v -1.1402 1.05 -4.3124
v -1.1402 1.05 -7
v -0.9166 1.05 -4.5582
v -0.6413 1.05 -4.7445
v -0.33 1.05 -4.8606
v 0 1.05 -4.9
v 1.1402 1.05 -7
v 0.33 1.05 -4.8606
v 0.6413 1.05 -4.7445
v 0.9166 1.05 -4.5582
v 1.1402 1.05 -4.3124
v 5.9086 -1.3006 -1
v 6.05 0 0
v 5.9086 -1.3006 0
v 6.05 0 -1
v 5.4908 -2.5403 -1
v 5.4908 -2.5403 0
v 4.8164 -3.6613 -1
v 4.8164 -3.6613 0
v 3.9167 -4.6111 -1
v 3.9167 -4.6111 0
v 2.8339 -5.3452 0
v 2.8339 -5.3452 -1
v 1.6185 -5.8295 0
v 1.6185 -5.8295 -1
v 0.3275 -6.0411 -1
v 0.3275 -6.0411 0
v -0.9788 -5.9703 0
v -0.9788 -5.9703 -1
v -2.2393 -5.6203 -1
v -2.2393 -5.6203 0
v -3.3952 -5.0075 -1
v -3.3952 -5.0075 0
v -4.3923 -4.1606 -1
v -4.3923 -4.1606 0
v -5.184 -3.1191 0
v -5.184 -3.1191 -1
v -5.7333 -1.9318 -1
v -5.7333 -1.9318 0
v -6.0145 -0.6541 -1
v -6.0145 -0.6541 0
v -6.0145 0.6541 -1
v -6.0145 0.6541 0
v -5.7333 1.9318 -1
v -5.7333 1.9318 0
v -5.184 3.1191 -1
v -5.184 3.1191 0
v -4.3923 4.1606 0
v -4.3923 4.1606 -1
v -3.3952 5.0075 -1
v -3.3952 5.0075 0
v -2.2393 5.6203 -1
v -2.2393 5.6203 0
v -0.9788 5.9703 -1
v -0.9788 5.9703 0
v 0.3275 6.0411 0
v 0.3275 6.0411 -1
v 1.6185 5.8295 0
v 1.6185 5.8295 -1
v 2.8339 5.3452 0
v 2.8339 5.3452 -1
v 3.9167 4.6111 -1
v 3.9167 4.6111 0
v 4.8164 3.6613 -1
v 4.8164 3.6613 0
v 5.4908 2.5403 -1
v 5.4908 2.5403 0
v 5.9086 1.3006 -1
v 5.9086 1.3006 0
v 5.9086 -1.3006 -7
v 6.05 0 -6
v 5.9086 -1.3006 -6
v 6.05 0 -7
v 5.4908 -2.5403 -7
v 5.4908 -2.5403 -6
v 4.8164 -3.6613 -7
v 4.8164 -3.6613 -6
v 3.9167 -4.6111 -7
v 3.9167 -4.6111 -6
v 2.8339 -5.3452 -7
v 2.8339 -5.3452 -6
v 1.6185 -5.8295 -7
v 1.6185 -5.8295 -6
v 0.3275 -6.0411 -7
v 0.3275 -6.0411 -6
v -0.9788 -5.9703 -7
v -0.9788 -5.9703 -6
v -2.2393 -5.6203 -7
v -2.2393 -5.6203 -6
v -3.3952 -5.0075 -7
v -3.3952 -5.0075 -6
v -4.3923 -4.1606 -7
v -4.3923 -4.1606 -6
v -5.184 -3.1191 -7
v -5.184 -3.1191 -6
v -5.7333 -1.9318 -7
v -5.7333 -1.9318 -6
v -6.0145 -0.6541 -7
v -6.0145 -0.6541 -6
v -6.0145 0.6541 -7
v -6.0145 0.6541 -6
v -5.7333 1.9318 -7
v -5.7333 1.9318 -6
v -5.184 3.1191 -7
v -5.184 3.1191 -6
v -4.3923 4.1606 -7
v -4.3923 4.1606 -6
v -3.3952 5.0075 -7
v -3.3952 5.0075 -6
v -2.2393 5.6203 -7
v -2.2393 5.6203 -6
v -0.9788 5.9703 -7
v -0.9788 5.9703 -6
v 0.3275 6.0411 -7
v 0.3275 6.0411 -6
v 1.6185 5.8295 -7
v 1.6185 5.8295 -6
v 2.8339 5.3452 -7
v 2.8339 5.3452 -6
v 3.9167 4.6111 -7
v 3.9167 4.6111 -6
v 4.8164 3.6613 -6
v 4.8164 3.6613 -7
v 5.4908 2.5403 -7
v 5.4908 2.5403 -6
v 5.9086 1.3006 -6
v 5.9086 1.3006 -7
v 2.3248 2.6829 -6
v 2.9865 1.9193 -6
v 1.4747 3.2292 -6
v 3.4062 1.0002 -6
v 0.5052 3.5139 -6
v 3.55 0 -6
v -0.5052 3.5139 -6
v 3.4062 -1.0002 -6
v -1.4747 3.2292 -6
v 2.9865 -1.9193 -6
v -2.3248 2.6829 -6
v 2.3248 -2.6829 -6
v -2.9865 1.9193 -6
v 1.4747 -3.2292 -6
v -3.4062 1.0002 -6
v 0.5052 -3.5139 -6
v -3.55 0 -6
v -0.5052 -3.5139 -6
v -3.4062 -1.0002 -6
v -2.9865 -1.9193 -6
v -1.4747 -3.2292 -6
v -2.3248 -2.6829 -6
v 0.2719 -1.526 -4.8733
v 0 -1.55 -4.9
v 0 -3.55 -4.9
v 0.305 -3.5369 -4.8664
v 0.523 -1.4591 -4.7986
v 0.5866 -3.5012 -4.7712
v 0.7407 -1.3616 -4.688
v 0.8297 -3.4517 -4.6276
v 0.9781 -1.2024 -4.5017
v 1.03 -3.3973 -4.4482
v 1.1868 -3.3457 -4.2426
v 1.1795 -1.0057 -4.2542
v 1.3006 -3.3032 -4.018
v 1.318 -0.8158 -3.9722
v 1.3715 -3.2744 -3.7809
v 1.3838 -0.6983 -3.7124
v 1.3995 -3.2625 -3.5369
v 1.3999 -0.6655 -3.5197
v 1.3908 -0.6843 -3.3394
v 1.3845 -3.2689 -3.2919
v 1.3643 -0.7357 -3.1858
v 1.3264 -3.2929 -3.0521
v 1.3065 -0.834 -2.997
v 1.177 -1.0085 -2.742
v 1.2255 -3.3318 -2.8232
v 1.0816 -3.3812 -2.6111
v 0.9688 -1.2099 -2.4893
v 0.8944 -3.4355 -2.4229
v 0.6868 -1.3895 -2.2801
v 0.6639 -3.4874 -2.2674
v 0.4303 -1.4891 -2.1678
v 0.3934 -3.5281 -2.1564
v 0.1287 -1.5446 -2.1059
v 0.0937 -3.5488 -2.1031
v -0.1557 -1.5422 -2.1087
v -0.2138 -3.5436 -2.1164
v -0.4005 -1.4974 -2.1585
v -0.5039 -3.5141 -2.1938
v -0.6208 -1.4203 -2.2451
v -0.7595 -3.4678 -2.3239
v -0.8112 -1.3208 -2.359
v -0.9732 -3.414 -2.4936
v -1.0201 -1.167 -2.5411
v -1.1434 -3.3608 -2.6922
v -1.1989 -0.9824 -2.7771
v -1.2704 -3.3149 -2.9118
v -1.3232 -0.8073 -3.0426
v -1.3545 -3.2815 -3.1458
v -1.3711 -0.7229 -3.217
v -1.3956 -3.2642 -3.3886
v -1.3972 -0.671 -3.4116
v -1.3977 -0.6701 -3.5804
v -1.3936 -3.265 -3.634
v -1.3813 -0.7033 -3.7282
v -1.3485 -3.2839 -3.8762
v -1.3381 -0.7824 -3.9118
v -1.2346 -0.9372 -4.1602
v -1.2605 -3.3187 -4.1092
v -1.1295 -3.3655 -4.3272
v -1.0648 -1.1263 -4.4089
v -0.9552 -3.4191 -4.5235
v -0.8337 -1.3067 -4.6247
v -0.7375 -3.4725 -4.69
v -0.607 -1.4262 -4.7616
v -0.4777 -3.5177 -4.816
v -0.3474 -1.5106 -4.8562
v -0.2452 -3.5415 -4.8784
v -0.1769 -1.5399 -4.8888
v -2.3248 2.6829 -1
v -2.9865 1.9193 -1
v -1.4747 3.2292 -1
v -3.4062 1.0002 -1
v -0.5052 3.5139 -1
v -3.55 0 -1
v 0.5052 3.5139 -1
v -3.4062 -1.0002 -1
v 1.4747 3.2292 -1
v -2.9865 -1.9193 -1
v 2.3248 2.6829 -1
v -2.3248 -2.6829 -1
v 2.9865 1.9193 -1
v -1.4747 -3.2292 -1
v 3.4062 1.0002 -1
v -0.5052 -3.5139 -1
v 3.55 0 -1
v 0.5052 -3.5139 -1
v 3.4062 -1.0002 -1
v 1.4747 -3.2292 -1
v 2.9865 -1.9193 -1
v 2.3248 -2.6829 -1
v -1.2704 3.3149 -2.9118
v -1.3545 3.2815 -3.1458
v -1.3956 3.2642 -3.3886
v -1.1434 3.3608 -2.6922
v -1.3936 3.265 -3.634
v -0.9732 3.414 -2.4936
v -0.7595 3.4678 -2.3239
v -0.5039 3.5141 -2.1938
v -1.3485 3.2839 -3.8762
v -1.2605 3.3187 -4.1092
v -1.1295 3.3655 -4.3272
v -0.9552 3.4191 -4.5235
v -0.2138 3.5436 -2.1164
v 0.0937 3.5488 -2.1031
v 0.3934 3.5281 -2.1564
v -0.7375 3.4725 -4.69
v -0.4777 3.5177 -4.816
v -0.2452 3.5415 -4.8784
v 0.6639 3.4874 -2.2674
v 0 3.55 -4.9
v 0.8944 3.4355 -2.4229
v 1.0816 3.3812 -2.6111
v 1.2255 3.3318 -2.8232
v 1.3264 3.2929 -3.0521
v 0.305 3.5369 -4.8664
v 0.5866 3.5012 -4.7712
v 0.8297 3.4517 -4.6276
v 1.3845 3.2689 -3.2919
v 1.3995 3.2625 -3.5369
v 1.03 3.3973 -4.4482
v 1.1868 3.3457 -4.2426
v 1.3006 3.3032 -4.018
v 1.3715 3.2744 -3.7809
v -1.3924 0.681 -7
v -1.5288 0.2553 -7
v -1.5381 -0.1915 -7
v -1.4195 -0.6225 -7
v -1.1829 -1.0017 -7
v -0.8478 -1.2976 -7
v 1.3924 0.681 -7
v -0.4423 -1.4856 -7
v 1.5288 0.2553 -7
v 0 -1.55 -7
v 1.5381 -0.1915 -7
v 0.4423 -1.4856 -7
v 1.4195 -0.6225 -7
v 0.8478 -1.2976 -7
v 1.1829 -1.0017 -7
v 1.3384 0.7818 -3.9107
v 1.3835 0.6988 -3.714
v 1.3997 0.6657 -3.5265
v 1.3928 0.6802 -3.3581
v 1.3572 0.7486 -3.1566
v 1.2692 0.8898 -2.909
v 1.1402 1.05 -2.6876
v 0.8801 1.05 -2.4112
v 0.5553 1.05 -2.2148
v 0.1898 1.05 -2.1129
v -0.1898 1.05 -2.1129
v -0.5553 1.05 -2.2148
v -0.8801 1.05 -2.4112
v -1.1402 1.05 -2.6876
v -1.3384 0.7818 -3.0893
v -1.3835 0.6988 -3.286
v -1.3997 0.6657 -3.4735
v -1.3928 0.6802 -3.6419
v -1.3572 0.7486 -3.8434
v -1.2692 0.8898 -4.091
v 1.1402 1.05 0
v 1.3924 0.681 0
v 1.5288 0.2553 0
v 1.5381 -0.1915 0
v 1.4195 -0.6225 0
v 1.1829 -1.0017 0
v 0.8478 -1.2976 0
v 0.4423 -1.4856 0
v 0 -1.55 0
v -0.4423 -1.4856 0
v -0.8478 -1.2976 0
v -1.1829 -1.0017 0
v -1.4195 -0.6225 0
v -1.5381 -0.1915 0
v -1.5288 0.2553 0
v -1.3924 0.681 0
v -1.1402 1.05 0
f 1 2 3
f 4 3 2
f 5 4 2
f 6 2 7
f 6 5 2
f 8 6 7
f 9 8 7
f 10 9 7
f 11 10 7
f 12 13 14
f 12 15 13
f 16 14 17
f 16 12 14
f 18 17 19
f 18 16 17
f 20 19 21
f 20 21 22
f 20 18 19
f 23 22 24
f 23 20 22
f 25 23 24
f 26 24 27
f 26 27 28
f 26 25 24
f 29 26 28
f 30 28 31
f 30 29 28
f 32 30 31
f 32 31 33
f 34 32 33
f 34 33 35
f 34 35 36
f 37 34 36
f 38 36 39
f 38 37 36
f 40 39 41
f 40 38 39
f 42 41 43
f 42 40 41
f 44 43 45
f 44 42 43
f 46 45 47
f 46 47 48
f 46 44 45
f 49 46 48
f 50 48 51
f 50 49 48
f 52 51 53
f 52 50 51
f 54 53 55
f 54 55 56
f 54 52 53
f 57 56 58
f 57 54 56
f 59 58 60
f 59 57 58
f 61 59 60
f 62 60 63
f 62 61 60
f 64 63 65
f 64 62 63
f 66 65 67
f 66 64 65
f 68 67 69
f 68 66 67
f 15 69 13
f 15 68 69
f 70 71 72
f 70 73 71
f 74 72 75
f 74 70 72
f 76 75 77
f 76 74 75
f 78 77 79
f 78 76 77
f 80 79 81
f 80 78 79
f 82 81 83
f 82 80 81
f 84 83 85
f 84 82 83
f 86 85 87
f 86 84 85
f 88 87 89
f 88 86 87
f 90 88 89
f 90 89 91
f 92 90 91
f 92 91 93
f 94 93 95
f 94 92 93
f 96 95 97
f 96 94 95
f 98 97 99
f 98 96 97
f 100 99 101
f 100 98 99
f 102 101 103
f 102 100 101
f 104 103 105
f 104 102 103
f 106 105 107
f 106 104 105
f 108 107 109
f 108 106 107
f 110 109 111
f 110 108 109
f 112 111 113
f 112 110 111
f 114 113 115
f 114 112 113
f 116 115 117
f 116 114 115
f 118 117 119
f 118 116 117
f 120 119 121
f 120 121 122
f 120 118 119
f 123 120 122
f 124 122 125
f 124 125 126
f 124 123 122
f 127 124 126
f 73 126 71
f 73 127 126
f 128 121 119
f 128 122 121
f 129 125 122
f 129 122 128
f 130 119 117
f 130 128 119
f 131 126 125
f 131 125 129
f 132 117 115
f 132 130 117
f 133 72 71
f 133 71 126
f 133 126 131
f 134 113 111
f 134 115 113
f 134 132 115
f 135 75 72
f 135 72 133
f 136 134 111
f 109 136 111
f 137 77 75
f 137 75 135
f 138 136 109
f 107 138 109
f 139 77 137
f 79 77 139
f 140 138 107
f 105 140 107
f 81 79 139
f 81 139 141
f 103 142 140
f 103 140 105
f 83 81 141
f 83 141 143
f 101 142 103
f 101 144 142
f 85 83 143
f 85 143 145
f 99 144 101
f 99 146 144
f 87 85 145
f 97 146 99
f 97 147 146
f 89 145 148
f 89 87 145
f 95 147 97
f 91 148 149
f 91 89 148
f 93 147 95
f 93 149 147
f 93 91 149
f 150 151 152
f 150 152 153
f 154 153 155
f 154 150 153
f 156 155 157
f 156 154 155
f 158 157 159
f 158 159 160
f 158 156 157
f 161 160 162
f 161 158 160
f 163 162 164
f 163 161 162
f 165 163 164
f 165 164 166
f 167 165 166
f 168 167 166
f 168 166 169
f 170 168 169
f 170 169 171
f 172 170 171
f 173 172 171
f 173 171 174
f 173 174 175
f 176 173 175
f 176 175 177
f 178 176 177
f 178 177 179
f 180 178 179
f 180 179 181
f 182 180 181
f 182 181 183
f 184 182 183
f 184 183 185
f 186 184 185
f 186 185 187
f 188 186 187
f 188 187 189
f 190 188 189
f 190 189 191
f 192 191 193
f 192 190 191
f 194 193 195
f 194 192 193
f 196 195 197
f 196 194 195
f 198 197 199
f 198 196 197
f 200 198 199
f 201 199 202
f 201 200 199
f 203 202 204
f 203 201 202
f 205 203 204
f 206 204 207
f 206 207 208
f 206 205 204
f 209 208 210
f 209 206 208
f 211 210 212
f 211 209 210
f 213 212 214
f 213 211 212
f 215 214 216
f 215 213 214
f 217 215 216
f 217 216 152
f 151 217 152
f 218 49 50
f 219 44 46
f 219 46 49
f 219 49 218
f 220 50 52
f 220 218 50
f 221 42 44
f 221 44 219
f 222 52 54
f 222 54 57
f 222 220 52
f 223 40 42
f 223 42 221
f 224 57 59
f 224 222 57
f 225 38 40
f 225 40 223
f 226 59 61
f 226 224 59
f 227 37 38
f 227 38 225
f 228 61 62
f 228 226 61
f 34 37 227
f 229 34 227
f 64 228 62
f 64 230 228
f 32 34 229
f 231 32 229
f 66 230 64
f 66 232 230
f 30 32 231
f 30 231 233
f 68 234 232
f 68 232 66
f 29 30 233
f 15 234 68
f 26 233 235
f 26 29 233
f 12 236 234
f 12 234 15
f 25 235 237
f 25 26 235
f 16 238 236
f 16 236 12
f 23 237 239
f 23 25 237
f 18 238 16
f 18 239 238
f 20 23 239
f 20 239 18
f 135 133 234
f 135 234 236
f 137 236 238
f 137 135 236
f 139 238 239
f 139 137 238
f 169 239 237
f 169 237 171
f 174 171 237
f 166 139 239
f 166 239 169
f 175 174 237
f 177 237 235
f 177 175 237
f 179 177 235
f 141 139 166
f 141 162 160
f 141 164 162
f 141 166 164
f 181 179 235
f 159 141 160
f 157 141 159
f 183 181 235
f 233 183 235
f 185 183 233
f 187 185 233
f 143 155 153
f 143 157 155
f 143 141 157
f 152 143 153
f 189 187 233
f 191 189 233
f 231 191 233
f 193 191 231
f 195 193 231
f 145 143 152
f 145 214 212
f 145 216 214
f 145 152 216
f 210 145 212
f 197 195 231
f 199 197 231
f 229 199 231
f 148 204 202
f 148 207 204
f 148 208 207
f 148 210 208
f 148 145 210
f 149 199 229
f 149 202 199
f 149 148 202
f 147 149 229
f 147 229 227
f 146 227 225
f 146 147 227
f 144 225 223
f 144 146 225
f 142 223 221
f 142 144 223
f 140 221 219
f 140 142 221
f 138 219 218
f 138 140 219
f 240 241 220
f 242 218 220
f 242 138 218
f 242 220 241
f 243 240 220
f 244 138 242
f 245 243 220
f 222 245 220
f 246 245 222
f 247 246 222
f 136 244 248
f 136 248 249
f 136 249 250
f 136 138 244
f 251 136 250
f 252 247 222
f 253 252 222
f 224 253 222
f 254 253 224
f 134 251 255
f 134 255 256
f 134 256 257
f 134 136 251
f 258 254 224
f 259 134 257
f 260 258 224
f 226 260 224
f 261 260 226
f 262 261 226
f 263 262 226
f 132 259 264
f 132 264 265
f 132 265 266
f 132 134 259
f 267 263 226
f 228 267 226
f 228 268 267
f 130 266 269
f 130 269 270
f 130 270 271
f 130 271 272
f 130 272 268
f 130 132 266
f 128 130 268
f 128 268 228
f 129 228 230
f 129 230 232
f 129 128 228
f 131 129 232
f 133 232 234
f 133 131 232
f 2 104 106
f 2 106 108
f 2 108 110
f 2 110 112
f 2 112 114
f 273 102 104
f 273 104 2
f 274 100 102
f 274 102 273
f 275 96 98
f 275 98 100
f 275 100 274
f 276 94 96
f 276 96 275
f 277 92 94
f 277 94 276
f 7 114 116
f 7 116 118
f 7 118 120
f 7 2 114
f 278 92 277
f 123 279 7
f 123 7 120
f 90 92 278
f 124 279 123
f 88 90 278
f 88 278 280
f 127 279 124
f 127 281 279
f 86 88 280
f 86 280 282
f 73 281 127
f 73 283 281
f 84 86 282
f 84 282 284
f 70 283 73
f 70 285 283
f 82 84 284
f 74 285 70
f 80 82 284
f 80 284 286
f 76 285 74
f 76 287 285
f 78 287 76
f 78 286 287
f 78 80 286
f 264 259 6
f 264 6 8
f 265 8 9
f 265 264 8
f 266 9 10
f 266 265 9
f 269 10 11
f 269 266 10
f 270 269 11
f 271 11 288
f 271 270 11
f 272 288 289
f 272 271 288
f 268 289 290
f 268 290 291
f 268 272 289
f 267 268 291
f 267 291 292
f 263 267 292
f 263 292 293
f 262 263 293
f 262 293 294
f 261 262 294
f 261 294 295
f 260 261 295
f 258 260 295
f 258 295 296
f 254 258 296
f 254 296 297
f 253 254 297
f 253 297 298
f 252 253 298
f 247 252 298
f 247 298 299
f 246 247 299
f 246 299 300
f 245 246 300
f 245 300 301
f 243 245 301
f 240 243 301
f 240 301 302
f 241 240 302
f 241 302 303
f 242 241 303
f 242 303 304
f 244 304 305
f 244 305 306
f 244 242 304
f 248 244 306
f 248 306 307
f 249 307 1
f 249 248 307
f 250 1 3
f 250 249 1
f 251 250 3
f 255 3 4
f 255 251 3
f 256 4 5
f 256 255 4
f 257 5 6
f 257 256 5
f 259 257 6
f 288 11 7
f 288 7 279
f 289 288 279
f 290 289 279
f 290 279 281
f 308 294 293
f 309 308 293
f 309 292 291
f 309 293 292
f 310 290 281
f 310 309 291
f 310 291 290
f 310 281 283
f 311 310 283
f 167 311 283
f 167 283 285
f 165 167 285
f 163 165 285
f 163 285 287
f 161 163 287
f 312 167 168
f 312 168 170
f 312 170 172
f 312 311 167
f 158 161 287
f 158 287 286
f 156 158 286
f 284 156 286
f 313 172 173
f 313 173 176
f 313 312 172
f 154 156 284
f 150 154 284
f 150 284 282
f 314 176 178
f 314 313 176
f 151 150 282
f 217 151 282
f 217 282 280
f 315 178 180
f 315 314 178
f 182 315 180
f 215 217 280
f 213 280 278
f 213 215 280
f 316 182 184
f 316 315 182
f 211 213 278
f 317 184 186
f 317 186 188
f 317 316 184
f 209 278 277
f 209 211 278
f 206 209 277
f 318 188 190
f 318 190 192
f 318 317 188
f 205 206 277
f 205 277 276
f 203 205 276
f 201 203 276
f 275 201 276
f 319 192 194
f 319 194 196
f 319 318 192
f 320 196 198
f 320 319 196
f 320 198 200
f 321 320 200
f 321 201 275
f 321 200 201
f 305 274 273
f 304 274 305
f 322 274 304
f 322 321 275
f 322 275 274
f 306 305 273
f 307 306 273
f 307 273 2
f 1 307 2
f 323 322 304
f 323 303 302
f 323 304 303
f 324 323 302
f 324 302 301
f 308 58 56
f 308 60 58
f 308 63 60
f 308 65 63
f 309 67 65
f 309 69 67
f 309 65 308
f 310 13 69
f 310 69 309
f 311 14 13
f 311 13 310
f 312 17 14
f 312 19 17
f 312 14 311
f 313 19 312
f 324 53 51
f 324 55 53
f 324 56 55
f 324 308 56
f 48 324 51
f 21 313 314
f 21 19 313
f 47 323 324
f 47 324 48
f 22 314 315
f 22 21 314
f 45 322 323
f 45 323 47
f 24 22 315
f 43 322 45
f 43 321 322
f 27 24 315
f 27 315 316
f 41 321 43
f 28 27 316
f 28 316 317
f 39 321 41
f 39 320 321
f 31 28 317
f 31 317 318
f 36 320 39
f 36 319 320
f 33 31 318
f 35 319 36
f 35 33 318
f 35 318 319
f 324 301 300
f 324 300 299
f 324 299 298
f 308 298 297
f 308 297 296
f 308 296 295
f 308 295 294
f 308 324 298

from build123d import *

# Parameters (mm, degrees)
BOSS_EXTRUDE1_DEPTH     = 7
CUT_EXTRUDE1_DEPTH      = 12.66243971
CUT_EXTRUDE1_DEPTH_BACK = 12.66243971
SKETCH5_R               = 1.4


with BuildPart() as part:
    # Sketch2 → Revolve1 (revolve)
    with BuildSketch(Plane(origin=(0, 0, 0), x_dir=(0, 0, -1), z_dir=(1, 0, 0)), mode=Mode.PRIVATE) as revolve1_sk:
        Polygon((0, 1.55), (0, 6.05), (1, 6.05), (1, 3.55), (6, 3.55), (6, 6.05), (7, 6.05), (7, 1.55), align=None)
    revolve(revolve1_sk.sketch.rotate(Axis((0, 0, 2.14137931), (0, 0, -1)), 90), axis=Axis((0, 0, 2.14137931), (0, 0, -1)))

    # Sketch4 → Boss-Extrude1 (add)
    with BuildSketch(Plane.XY):
        with BuildLine():
            ThreePointArc((1.140175425, 1.05), (0, 1.55), (-1.140175425, 1.05))
            Line((-1.140175425, 1.05), (1.140175425, 1.05))
        make_face()
    extrude(amount=-BOSS_EXTRUDE1_DEPTH)

    # Sketch5 → Cut-Extrude1 (cut, two sides: drawn at the far end of the back side and taken through both)
    with BuildSketch(Plane.XZ.offset(-1.05).offset(-CUT_EXTRUDE1_DEPTH_BACK)):
        with Locations(Location((0, -3.5, 0), (0, 0, 270))):
            Circle(SKETCH5_R)
    extrude(amount=CUT_EXTRUDE1_DEPTH + CUT_EXTRUDE1_DEPTH_BACK, mode=Mode.SUBTRACT)


solid = part.part
